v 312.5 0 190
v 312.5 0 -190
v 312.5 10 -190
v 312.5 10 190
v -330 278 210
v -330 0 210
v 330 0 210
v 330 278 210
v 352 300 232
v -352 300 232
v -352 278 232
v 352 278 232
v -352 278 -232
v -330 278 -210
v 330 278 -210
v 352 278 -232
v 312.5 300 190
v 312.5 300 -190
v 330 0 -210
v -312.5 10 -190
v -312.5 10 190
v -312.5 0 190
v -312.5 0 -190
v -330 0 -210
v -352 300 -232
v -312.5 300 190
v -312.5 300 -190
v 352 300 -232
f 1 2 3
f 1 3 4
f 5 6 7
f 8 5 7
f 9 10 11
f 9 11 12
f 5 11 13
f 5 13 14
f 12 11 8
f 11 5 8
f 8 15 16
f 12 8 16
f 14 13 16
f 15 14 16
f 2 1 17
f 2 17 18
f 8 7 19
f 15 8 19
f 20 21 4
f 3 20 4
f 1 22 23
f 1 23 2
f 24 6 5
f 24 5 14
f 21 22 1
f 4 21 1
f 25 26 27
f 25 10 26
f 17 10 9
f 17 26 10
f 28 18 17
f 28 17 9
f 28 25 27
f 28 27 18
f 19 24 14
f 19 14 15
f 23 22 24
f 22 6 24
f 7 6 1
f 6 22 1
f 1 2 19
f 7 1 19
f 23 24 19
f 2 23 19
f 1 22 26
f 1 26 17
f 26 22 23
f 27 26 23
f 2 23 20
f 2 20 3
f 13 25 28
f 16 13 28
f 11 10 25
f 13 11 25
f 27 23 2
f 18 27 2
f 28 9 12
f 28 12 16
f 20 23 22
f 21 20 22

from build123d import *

# Parameters (mm, degrees)
SKETCH1_W           = 660
SKETCH1_H           = 420
SKETCH1_W_2         = 625
SKETCH1_H_2         = 380
BOSS_EXTRUDE1_DEPTH = 300
SKETCH2_W           = 625
SKETCH2_H           = 380
BOSS_EXTRUDE2_DEPTH = 10
SKETCH3_W           = 704
SKETCH3_H           = 464
SKETCH3_W_2         = 660
SKETCH3_H_2         = 420
BOSS_EXTRUDE3_DEPTH = 22


with BuildPart() as part:
    # Sketch1 → Boss-Extrude1 (new body)
    with BuildSketch(Plane(origin=(0, 0, 0), x_dir=(1, 0, 0), z_dir=(0, 1, 0))):
        Rectangle(SKETCH1_W, SKETCH1_H)
        Rectangle(SKETCH1_W_2, SKETCH1_H_2, mode=Mode.SUBTRACT)
    extrude(amount=BOSS_EXTRUDE1_DEPTH)

    # Sketch3 → Boss-Extrude3 (add)
    with BuildSketch(Plane(origin=(0, 300, 0), x_dir=(1, 0, 0), z_dir=(0, 1, 0))):
        Rectangle(SKETCH3_W, SKETCH3_H)
        Rectangle(SKETCH3_W_2, SKETCH3_H_2, mode=Mode.SUBTRACT)
    extrude(amount=-BOSS_EXTRUDE3_DEPTH)


with BuildPart() as body_2:
    # Sketch2 → Boss-Extrude2 (new body)
    with BuildSketch(Plane.XZ):
        Rectangle(SKETCH2_W, SKETCH2_H)
    extrude(amount=-BOSS_EXTRUDE2_DEPTH)


solid = Compound([part.part, body_2.part])
